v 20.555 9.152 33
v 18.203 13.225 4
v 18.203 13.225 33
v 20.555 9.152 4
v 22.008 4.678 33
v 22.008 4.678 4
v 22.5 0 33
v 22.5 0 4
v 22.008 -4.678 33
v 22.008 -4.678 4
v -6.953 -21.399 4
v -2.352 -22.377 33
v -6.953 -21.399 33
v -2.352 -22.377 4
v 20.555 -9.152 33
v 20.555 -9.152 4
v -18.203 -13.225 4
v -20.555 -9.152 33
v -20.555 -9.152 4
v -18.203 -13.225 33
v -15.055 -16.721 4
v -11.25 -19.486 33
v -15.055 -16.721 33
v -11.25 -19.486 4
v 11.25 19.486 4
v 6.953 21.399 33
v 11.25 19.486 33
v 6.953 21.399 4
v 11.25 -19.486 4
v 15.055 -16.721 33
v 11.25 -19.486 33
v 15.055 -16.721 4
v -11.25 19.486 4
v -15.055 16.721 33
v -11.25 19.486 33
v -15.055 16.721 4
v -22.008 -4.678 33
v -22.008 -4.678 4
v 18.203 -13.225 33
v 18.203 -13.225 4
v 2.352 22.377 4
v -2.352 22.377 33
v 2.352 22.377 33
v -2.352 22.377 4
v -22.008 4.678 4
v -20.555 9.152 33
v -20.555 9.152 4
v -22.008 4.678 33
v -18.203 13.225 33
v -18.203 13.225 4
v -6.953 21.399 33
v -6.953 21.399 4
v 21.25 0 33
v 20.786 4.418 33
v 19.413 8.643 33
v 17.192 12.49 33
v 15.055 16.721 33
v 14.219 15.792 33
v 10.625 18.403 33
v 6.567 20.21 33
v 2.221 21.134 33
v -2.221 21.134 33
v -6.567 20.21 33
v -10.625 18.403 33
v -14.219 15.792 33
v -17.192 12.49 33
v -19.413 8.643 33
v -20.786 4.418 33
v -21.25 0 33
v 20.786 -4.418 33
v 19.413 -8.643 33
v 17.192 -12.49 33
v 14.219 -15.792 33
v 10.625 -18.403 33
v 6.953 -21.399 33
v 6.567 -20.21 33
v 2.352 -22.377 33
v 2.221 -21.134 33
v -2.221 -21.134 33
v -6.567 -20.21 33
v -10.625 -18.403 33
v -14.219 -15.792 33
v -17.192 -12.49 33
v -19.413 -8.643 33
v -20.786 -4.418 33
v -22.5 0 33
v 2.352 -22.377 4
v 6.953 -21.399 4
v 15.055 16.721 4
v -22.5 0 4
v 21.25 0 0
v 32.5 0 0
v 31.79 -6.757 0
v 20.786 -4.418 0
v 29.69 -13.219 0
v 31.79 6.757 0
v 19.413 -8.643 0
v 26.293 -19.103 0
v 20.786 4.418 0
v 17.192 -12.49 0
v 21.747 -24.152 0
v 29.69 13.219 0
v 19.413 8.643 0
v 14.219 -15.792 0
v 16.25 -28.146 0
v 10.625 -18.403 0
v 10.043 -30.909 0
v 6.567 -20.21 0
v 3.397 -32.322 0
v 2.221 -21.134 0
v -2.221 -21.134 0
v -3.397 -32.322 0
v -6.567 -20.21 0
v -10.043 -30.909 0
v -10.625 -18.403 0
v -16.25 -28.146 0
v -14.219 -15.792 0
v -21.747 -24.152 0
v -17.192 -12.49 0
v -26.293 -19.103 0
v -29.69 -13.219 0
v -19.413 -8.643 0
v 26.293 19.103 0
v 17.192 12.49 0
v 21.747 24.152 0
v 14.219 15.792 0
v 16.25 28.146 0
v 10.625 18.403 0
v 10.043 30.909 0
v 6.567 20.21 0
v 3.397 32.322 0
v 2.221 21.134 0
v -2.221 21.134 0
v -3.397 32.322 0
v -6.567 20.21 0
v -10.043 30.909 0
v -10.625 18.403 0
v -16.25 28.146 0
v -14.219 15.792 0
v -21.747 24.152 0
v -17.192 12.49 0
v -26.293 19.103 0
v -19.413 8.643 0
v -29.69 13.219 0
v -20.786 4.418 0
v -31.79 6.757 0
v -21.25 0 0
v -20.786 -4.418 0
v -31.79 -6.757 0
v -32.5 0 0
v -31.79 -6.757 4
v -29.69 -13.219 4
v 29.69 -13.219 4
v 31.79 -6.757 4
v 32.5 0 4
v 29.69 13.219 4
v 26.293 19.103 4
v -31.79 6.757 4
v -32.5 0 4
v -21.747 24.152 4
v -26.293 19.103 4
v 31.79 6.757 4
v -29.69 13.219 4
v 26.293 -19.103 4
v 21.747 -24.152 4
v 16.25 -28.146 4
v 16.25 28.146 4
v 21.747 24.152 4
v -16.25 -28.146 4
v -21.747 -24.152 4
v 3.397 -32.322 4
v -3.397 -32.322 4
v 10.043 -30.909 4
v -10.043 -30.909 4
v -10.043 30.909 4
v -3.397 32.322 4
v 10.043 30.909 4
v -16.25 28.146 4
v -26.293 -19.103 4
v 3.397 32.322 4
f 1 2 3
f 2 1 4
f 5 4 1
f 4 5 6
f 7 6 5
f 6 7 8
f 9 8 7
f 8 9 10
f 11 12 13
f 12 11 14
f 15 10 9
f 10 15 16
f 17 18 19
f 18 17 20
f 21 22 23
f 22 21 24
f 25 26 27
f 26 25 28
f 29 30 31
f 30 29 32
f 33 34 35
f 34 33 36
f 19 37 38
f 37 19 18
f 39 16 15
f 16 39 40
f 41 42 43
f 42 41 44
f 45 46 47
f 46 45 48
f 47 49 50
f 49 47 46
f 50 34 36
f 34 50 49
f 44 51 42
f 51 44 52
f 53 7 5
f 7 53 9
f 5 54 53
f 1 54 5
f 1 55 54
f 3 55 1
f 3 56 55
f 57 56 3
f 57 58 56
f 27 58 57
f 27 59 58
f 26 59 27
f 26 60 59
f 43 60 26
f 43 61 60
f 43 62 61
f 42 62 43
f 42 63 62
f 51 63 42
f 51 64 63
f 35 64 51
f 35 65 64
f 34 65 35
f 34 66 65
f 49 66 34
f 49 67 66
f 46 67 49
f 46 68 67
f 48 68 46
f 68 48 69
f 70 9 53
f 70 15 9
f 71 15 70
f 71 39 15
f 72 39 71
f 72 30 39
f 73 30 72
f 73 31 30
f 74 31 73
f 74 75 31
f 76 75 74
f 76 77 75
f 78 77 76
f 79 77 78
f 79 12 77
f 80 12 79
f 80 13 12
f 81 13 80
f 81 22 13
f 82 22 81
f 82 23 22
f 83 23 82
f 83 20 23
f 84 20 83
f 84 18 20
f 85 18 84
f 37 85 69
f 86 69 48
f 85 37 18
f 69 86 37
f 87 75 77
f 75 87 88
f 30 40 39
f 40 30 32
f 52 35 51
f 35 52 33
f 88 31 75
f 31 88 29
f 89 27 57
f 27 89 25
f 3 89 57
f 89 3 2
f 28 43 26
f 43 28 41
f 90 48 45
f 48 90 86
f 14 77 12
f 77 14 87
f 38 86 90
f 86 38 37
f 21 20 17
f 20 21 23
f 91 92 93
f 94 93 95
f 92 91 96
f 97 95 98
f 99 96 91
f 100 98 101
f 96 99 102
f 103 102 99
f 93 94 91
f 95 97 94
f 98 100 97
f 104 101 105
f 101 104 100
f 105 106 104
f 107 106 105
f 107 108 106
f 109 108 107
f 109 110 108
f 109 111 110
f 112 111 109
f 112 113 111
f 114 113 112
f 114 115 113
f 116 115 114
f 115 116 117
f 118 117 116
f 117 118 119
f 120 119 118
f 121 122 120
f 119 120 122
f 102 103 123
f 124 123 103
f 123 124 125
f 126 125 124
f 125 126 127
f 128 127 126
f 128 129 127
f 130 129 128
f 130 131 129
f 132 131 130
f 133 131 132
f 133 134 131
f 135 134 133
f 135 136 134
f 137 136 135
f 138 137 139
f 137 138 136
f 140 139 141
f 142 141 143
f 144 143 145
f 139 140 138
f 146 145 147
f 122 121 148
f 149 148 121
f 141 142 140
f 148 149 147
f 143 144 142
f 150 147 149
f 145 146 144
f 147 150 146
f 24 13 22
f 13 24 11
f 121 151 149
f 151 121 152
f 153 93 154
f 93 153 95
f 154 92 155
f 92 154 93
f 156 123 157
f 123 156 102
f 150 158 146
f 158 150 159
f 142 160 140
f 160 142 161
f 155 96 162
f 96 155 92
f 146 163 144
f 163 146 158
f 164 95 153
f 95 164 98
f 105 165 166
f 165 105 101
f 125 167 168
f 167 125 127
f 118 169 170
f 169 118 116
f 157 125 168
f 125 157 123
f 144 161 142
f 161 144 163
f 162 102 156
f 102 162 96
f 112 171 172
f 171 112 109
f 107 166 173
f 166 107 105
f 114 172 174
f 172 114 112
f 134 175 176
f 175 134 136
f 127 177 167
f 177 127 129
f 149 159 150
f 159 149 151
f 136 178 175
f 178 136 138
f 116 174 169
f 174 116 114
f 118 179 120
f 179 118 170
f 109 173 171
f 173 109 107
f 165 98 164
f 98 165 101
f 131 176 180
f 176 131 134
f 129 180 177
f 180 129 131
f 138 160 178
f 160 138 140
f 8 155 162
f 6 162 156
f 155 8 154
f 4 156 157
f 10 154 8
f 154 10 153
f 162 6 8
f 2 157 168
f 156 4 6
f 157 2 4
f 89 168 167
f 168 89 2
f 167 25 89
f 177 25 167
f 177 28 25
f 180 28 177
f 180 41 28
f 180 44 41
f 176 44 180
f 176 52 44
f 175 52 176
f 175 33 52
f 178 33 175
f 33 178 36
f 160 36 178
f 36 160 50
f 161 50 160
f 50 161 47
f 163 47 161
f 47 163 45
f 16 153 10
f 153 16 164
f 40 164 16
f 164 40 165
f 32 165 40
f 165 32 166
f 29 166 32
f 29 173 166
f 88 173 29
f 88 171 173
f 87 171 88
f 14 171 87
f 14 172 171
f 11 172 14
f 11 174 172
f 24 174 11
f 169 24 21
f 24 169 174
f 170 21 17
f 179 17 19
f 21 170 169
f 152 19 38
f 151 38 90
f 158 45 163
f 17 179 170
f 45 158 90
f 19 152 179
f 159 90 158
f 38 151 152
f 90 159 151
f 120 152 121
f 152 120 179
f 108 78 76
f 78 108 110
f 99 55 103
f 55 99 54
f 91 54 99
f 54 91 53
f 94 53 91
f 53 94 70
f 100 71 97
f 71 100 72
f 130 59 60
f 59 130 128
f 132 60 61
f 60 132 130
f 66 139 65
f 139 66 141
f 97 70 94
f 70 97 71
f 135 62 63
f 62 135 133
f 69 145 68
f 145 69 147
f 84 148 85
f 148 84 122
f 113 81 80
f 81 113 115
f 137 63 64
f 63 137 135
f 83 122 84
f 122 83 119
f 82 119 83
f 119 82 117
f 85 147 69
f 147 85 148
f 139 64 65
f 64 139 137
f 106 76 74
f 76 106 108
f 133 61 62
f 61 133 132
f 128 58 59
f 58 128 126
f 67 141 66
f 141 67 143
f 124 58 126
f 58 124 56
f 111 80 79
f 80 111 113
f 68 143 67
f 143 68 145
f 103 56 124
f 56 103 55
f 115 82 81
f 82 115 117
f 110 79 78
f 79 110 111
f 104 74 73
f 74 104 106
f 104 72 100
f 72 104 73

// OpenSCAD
// file: parameters/verticalShaftHolderParameters.scad
// https://paper.dropbox.com/doc/Shaft-Holder-with-Bearings--BPUd0R93dqpLMge3XfPWzi2zAg-a79LjXcU3vrNJJHZMteSG

rollerBearingInsideDiameter = 45; // Same as Thrust Bearing bore diameter
rollerBearingHeight = 20;
rollerBearingOutsideDiameter = 52.2;

thrustBearingOutsideDiameter = 65;
thrustBearingHeight = 14;
thrustBearingOuterDiameterShaftWasher = 47;

thrustBearingMinimumAbutmentDiameter = 57; // This is a MINIMUM

comfortablePinningDiameter = 55; // Could maybe be bigger?
comfortablePinnedSectionHeight = 20; // May need testing
// file: parameters/commonParameters.scad
// All measurements in millimeters

// "horizontal" and "vertical" refer to how they are printed on the print bed,
// not how they work on the final assembly.
// ALWAYS print verticle pipes straight up if possible, that is 90 degrees from the bed.
// Attempting to print a slanted pipe will be troublesome and require testing for a proper size.
// However, you can print ANY angle ON the bed.

// 1.25" PVC Pipe:
horizontalPipeInsideDiameter_1_25pvc = 42.9;
verticalPipeInsideDiameter_1_25pvc = 42.5;

// 0.5" PVC Pipe:
horizontalPipeInsideDiameter_0_50pvc = 22.1;
verticalPipeInsideDiameter_0_50pvc = 21.7;

// Parameters
jointLegLength = 50;
jointWallThickness = 3.5;
jointPinningHoleDiameter = 7;
jointPinHoleOffset = 10;

// Walker Foot Parameters
inchesToMmConversionFactor = 25.4;

// Current idea is 11 x 21 inches.
walkerFootHeight = 11 * inchesToMmConversionFactor;
walkerFootLength = 21 * inchesToMmConversionFactor;
// Back of Foot is 4 inches longer to cause foot to hang AND LOOK as desired
// I tried 1 inch and it had basically NO affect on how it hangs.
// I think it looks cool at 4 inches, so I am going to test that.
// I *THINK* that it actually doesn't affect lenght of the walker, because the front
// of one compensates for the back of the other.
walkerFootCenterOffset = 0 * inchesToMmConversionFactor; // Remember to multiply any offset by the conversion factor.
walkerFootFrontLength = (walkerFootLength / 2) - (walkerFootCenterOffset / 2);
walkerFootBackLength = (walkerFootLength / 2) + (walkerFootCenterOffset / 2);

footLowerJointLegLength = 75;

// Angles
// This site is great for visualizing what you want: https://www.blocklayer.com/trig/scaleneeng.aspx
// Use this site to check your math and results: https://www.calculator.net/right-triangle-calculator.html
//echo("=======================================================");
//echo("Walker Foot Parameters");
//echo("walkerFootLength", walkerFootLength, walkerFootFrontLength + walkerFootBackLength);
//echo("=======================================================");
//echo("Front:");
//echo("walkerFootHeight (a)", walkerFootHeight);
//echo("walkerFootFrontLength (b)", walkerFootFrontLength);
//walkerFootFrontTriangleTopLength = sqrt(pow(walkerFootHeight, 2) + pow(walkerFootFrontLength, 2));
//echo("walkerFootFrontTriangleTopLength (c)", walkerFootFrontTriangleTopLength);
//walkerFootFrontJointAngle = asin(walkerFootHeight / walkerFootFrontTriangleTopLength);
//echo("walkerFootFrontJointAngle (α):", walkerFootFrontJointAngle);
//walkerAnkleFrontAngle = asin(walkerFootFrontLength / walkerFootFrontTriangleTopLength);
//echo("walkerAnkleFrontAngle (β)", walkerAnkleFrontAngle);
//echo("-------------------------------------------------------");
//echo("Back");
//echo("walkerFootBackLength (b)", walkerFootBackLength);
//walkerFootBackTriangleTopLength = sqrt(pow(walkerFootHeight, 2) + pow(walkerFootBackLength, 2));
//echo("walkerFootBackTriangleTopLength (c)", walkerFootBackTriangleTopLength);
//walkerFootBackJointAngle = asin(walkerFootHeight / walkerFootBackTriangleTopLength);
//echo("walkerFootBackJointAngle (α):", walkerFootBackJointAngle);
//walkerAnkleBackAngle = asin(walkerFootBackLength / walkerFootBackTriangleTopLength);
//echo("walkerAnkleBackAngle (β)", walkerAnkleBackAngle);
//echo("=======================================================");



// This height is purely based on giving space for nice triangles supports.
// It could be shorter, just be sure to adjust the triangles.
walkerBodyLowerShaftHolderRollerBearingHeightAboveThrustBearing = 50;

// 12v Battery Box
batteryHolderWallThickness = 5;

// Battery Dimensions
// https://www.power-sonic.com/product/ps-1290/
batteryHeight = 94;
batteryWidth = 65.6; // Ben uses 65.6, Web Site says 65
batteryLength = 150.6; // Ben uses 150.6, Web site says 141
batteryBoxDepth = 60; // This is arbitrary. Ben uses 60 for the Dalek

// Colors
JointColor = "CornflowerBlue";
PipeColor = "Pink";

// Resoution
// This is perfect for 3D Printing,
// but you may want to comment it out while working to improve preview
// performance
//$fa = 1;
//$fs = 0.4;
// Although this makes it VERY high rez, which might be better for the slicer? Experimenting with it instead.
// NOTE that using $fn causes FreeCAD and hence .step files exported to Fusion 360 to show round items as a series of faces instead of a single object.
//$fn = 500;
// file: verticalShaftHolder.scad
include <parameters/commonParameters.scad>;
include <parameters/verticalShaftHolderParameters.scad>;

// This piece should be able to slide onto the shaft,
// be pinned in place,
// Have a Thrust Bearing sit on it,
// and then have a part that moves around the shaft sit on it.

module verticalShaftHolder(includePinnedRing = true, thrustBearingSupportHeight = thrustBearingHeight,
rollerBearingHeightAboveThrustBearing = thrustBearingHeight, roundedThrustBearingSupport = true, thrustBearingHeightOverride = thrustBearingHeight) {

    totalPartHeight = (includePinnedRing ? comfortablePinnedSectionHeight : 0) +
        thrustBearingSupportHeight +
        thrustBearingHeightOverride +
        rollerBearingHeightAboveThrustBearing +
        rollerBearingHeight;
    echo(str("Height: ", totalPartHeight));

    difference() {
        union() {
            // This is for the roller bearing to work against,
            // and constitutes the overall height
            cylinder(h = totalPartHeight, d = rollerBearingInsideDiameter);

            if (includePinnedRing) {
                // Pin this part
                cylinder(h = comfortablePinnedSectionHeight, d = comfortablePinningDiameter);
            }

            // This is to support the thrust bearing
            translate([0, 0, includePinnedRing ? comfortablePinnedSectionHeight : 0])
                rotate([180, 0, 0])
                    translate([0, 0, - thrustBearingSupportHeight])
                        if (roundedThrustBearingSupport) {
                            hull() {
                                cylinder(h = thrustBearingSupportHeight - 5, d = thrustBearingOutsideDiameter);
                                translate([0, 0, thrustBearingSupportHeight - 5])
                                    rotate_extrude()
                                        translate([(thrustBearingOutsideDiameter / 2) - 5, 0]) circle(r = 5);
                            }
                        } else {
                                cylinder(h = thrustBearingSupportHeight, d = thrustBearingOutsideDiameter);
                        }
        }
        // Hollow out for the pipe to fit in.
        translate([0, 0, - 1]) // -1 just ensures we clear the bottom and don't leave a 2d "film"
            cylinder(h = totalPartHeight + 10, d = verticalPipeInsideDiameter_1_25pvc);

        if (includePinnedRing) {
            // Make a hole near the end of the leg for pinning
            // The -0.01 ensures that the end of the tube is clear.
            rotate([90, 0, 0])
                translate([0, comfortablePinnedSectionHeight / 2, 0])
                    cylinder(
                    h = 500, d = jointPinningHoleDiameter, center = true);
        }
    }
}

//verticalShaftHolder();

// Use this to view the two shafts together
//include<verticalShaftHolderPivotPoint.scad>;
//translate([0, 0, thrustBearingHeight * 2])
//    verticalShaftHolderPivotPoint();
// main file
include <verticalShaftHolder.scad>;

verticalShaftHolder(includePinnedRing = false, rollerBearingHeightAboveThrustBearing = 9, roundedThrustBearingSupport = false, thrustBearingSupportHeight = 4, thrustBearingHeightOverride = 0);
